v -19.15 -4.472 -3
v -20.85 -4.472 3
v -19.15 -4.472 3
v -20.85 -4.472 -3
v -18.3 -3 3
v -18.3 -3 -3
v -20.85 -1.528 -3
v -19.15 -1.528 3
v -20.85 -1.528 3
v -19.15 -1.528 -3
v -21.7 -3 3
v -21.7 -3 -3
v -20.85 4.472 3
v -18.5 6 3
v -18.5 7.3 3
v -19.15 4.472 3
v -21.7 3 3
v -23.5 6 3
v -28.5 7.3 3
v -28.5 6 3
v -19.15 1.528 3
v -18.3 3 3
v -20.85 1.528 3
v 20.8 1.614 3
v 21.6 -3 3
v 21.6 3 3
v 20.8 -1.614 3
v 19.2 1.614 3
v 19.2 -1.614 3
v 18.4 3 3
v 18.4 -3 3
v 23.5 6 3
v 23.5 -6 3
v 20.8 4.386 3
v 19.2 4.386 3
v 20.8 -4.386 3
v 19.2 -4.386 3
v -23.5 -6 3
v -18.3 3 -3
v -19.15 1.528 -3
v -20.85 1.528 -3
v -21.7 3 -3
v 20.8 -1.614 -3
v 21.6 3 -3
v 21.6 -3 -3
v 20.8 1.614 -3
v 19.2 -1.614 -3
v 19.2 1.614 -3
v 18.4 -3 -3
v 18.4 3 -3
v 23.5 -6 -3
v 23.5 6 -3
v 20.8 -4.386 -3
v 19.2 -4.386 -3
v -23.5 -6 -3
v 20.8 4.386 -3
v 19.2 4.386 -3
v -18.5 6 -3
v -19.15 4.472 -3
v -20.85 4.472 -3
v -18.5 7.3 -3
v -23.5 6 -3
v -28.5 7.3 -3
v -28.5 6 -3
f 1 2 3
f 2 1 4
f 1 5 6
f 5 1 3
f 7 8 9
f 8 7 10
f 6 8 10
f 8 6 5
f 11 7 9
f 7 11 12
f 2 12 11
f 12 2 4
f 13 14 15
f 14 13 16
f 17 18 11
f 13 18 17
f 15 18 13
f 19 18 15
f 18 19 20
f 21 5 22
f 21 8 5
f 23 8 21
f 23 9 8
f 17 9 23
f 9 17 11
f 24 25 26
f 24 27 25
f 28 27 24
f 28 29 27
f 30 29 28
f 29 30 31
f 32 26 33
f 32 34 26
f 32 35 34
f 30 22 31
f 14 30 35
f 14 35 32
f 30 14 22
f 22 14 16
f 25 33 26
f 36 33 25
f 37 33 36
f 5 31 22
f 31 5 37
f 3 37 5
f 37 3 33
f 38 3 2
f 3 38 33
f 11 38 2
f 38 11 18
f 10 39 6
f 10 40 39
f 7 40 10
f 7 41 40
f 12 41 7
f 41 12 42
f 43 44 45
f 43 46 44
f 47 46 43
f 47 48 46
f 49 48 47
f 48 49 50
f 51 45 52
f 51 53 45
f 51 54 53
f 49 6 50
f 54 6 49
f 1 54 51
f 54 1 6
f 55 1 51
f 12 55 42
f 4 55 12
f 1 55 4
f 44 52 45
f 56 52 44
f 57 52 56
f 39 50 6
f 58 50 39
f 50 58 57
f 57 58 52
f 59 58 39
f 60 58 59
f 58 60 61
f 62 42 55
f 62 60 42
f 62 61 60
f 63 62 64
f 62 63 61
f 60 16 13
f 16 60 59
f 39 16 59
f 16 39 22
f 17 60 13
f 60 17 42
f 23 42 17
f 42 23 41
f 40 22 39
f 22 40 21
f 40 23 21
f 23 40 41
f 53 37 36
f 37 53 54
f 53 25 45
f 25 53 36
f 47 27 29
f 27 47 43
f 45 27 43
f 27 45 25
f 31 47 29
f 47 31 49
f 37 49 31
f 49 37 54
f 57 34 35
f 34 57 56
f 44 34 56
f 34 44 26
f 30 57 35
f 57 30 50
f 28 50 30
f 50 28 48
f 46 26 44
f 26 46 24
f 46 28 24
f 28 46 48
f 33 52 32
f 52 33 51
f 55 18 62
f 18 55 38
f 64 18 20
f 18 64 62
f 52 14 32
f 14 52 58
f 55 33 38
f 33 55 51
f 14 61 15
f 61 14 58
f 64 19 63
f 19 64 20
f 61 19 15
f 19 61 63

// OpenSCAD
/* TAL221 Load Cell - Basic dimensional representation of the TAL220
    Copyright (C) 2019 Benjamin Hubbard

    This program is free software: you can redistribute it and/or modify
    it under the terms of the GNU General Public License as published by
    the Free Software Foundation, either version 3 of the License, or
    (at your option) any later version.

    This program is distributed in the hope that it will be useful,
    but WITHOUT ANY WARRANTY; without even the implied warranty of
    MERCHANTABILITY or FITNESS FOR A PARTICULAR PURPOSE.  See the
    GNU General Public License for more details.

    You should have received a copy of the GNU General Public License
    along with this program.  If not, see <https://www.gnu.org/licenses/>.
 */
 
 TAL221();
 
 module TAL221() {
   // Outer Dimensions (l, w, h)
   dim   = [47, 12, 6];
   
   // Hole locations.
   holeX = [-20, -20, 20, 20];
   holeY = [-3, 3, -3, 3];
   
   // Hole diameters (M4, M4, M5, M5).
   diam  = [3.4, 3.4, 3.2 , 3.2];
   
   // Strain gage cables.
   cableThickness = 1.3;
   
   // Make the TAL220, centroid at the origin.
   difference() {
     cube(dim, center = true);
     for (i=[0:3]) {
       translate([holeX[i], holeY[i], 0])cylinder(d = diam[i], h = dim[2], center=true);
     }
   }
   
   // Add cable stuff.
   translate([-dim[0]/2, dim[1]/2 + cableThickness/2, 0])cube([10, cableThickness, dim[2]], center=true);
 }
